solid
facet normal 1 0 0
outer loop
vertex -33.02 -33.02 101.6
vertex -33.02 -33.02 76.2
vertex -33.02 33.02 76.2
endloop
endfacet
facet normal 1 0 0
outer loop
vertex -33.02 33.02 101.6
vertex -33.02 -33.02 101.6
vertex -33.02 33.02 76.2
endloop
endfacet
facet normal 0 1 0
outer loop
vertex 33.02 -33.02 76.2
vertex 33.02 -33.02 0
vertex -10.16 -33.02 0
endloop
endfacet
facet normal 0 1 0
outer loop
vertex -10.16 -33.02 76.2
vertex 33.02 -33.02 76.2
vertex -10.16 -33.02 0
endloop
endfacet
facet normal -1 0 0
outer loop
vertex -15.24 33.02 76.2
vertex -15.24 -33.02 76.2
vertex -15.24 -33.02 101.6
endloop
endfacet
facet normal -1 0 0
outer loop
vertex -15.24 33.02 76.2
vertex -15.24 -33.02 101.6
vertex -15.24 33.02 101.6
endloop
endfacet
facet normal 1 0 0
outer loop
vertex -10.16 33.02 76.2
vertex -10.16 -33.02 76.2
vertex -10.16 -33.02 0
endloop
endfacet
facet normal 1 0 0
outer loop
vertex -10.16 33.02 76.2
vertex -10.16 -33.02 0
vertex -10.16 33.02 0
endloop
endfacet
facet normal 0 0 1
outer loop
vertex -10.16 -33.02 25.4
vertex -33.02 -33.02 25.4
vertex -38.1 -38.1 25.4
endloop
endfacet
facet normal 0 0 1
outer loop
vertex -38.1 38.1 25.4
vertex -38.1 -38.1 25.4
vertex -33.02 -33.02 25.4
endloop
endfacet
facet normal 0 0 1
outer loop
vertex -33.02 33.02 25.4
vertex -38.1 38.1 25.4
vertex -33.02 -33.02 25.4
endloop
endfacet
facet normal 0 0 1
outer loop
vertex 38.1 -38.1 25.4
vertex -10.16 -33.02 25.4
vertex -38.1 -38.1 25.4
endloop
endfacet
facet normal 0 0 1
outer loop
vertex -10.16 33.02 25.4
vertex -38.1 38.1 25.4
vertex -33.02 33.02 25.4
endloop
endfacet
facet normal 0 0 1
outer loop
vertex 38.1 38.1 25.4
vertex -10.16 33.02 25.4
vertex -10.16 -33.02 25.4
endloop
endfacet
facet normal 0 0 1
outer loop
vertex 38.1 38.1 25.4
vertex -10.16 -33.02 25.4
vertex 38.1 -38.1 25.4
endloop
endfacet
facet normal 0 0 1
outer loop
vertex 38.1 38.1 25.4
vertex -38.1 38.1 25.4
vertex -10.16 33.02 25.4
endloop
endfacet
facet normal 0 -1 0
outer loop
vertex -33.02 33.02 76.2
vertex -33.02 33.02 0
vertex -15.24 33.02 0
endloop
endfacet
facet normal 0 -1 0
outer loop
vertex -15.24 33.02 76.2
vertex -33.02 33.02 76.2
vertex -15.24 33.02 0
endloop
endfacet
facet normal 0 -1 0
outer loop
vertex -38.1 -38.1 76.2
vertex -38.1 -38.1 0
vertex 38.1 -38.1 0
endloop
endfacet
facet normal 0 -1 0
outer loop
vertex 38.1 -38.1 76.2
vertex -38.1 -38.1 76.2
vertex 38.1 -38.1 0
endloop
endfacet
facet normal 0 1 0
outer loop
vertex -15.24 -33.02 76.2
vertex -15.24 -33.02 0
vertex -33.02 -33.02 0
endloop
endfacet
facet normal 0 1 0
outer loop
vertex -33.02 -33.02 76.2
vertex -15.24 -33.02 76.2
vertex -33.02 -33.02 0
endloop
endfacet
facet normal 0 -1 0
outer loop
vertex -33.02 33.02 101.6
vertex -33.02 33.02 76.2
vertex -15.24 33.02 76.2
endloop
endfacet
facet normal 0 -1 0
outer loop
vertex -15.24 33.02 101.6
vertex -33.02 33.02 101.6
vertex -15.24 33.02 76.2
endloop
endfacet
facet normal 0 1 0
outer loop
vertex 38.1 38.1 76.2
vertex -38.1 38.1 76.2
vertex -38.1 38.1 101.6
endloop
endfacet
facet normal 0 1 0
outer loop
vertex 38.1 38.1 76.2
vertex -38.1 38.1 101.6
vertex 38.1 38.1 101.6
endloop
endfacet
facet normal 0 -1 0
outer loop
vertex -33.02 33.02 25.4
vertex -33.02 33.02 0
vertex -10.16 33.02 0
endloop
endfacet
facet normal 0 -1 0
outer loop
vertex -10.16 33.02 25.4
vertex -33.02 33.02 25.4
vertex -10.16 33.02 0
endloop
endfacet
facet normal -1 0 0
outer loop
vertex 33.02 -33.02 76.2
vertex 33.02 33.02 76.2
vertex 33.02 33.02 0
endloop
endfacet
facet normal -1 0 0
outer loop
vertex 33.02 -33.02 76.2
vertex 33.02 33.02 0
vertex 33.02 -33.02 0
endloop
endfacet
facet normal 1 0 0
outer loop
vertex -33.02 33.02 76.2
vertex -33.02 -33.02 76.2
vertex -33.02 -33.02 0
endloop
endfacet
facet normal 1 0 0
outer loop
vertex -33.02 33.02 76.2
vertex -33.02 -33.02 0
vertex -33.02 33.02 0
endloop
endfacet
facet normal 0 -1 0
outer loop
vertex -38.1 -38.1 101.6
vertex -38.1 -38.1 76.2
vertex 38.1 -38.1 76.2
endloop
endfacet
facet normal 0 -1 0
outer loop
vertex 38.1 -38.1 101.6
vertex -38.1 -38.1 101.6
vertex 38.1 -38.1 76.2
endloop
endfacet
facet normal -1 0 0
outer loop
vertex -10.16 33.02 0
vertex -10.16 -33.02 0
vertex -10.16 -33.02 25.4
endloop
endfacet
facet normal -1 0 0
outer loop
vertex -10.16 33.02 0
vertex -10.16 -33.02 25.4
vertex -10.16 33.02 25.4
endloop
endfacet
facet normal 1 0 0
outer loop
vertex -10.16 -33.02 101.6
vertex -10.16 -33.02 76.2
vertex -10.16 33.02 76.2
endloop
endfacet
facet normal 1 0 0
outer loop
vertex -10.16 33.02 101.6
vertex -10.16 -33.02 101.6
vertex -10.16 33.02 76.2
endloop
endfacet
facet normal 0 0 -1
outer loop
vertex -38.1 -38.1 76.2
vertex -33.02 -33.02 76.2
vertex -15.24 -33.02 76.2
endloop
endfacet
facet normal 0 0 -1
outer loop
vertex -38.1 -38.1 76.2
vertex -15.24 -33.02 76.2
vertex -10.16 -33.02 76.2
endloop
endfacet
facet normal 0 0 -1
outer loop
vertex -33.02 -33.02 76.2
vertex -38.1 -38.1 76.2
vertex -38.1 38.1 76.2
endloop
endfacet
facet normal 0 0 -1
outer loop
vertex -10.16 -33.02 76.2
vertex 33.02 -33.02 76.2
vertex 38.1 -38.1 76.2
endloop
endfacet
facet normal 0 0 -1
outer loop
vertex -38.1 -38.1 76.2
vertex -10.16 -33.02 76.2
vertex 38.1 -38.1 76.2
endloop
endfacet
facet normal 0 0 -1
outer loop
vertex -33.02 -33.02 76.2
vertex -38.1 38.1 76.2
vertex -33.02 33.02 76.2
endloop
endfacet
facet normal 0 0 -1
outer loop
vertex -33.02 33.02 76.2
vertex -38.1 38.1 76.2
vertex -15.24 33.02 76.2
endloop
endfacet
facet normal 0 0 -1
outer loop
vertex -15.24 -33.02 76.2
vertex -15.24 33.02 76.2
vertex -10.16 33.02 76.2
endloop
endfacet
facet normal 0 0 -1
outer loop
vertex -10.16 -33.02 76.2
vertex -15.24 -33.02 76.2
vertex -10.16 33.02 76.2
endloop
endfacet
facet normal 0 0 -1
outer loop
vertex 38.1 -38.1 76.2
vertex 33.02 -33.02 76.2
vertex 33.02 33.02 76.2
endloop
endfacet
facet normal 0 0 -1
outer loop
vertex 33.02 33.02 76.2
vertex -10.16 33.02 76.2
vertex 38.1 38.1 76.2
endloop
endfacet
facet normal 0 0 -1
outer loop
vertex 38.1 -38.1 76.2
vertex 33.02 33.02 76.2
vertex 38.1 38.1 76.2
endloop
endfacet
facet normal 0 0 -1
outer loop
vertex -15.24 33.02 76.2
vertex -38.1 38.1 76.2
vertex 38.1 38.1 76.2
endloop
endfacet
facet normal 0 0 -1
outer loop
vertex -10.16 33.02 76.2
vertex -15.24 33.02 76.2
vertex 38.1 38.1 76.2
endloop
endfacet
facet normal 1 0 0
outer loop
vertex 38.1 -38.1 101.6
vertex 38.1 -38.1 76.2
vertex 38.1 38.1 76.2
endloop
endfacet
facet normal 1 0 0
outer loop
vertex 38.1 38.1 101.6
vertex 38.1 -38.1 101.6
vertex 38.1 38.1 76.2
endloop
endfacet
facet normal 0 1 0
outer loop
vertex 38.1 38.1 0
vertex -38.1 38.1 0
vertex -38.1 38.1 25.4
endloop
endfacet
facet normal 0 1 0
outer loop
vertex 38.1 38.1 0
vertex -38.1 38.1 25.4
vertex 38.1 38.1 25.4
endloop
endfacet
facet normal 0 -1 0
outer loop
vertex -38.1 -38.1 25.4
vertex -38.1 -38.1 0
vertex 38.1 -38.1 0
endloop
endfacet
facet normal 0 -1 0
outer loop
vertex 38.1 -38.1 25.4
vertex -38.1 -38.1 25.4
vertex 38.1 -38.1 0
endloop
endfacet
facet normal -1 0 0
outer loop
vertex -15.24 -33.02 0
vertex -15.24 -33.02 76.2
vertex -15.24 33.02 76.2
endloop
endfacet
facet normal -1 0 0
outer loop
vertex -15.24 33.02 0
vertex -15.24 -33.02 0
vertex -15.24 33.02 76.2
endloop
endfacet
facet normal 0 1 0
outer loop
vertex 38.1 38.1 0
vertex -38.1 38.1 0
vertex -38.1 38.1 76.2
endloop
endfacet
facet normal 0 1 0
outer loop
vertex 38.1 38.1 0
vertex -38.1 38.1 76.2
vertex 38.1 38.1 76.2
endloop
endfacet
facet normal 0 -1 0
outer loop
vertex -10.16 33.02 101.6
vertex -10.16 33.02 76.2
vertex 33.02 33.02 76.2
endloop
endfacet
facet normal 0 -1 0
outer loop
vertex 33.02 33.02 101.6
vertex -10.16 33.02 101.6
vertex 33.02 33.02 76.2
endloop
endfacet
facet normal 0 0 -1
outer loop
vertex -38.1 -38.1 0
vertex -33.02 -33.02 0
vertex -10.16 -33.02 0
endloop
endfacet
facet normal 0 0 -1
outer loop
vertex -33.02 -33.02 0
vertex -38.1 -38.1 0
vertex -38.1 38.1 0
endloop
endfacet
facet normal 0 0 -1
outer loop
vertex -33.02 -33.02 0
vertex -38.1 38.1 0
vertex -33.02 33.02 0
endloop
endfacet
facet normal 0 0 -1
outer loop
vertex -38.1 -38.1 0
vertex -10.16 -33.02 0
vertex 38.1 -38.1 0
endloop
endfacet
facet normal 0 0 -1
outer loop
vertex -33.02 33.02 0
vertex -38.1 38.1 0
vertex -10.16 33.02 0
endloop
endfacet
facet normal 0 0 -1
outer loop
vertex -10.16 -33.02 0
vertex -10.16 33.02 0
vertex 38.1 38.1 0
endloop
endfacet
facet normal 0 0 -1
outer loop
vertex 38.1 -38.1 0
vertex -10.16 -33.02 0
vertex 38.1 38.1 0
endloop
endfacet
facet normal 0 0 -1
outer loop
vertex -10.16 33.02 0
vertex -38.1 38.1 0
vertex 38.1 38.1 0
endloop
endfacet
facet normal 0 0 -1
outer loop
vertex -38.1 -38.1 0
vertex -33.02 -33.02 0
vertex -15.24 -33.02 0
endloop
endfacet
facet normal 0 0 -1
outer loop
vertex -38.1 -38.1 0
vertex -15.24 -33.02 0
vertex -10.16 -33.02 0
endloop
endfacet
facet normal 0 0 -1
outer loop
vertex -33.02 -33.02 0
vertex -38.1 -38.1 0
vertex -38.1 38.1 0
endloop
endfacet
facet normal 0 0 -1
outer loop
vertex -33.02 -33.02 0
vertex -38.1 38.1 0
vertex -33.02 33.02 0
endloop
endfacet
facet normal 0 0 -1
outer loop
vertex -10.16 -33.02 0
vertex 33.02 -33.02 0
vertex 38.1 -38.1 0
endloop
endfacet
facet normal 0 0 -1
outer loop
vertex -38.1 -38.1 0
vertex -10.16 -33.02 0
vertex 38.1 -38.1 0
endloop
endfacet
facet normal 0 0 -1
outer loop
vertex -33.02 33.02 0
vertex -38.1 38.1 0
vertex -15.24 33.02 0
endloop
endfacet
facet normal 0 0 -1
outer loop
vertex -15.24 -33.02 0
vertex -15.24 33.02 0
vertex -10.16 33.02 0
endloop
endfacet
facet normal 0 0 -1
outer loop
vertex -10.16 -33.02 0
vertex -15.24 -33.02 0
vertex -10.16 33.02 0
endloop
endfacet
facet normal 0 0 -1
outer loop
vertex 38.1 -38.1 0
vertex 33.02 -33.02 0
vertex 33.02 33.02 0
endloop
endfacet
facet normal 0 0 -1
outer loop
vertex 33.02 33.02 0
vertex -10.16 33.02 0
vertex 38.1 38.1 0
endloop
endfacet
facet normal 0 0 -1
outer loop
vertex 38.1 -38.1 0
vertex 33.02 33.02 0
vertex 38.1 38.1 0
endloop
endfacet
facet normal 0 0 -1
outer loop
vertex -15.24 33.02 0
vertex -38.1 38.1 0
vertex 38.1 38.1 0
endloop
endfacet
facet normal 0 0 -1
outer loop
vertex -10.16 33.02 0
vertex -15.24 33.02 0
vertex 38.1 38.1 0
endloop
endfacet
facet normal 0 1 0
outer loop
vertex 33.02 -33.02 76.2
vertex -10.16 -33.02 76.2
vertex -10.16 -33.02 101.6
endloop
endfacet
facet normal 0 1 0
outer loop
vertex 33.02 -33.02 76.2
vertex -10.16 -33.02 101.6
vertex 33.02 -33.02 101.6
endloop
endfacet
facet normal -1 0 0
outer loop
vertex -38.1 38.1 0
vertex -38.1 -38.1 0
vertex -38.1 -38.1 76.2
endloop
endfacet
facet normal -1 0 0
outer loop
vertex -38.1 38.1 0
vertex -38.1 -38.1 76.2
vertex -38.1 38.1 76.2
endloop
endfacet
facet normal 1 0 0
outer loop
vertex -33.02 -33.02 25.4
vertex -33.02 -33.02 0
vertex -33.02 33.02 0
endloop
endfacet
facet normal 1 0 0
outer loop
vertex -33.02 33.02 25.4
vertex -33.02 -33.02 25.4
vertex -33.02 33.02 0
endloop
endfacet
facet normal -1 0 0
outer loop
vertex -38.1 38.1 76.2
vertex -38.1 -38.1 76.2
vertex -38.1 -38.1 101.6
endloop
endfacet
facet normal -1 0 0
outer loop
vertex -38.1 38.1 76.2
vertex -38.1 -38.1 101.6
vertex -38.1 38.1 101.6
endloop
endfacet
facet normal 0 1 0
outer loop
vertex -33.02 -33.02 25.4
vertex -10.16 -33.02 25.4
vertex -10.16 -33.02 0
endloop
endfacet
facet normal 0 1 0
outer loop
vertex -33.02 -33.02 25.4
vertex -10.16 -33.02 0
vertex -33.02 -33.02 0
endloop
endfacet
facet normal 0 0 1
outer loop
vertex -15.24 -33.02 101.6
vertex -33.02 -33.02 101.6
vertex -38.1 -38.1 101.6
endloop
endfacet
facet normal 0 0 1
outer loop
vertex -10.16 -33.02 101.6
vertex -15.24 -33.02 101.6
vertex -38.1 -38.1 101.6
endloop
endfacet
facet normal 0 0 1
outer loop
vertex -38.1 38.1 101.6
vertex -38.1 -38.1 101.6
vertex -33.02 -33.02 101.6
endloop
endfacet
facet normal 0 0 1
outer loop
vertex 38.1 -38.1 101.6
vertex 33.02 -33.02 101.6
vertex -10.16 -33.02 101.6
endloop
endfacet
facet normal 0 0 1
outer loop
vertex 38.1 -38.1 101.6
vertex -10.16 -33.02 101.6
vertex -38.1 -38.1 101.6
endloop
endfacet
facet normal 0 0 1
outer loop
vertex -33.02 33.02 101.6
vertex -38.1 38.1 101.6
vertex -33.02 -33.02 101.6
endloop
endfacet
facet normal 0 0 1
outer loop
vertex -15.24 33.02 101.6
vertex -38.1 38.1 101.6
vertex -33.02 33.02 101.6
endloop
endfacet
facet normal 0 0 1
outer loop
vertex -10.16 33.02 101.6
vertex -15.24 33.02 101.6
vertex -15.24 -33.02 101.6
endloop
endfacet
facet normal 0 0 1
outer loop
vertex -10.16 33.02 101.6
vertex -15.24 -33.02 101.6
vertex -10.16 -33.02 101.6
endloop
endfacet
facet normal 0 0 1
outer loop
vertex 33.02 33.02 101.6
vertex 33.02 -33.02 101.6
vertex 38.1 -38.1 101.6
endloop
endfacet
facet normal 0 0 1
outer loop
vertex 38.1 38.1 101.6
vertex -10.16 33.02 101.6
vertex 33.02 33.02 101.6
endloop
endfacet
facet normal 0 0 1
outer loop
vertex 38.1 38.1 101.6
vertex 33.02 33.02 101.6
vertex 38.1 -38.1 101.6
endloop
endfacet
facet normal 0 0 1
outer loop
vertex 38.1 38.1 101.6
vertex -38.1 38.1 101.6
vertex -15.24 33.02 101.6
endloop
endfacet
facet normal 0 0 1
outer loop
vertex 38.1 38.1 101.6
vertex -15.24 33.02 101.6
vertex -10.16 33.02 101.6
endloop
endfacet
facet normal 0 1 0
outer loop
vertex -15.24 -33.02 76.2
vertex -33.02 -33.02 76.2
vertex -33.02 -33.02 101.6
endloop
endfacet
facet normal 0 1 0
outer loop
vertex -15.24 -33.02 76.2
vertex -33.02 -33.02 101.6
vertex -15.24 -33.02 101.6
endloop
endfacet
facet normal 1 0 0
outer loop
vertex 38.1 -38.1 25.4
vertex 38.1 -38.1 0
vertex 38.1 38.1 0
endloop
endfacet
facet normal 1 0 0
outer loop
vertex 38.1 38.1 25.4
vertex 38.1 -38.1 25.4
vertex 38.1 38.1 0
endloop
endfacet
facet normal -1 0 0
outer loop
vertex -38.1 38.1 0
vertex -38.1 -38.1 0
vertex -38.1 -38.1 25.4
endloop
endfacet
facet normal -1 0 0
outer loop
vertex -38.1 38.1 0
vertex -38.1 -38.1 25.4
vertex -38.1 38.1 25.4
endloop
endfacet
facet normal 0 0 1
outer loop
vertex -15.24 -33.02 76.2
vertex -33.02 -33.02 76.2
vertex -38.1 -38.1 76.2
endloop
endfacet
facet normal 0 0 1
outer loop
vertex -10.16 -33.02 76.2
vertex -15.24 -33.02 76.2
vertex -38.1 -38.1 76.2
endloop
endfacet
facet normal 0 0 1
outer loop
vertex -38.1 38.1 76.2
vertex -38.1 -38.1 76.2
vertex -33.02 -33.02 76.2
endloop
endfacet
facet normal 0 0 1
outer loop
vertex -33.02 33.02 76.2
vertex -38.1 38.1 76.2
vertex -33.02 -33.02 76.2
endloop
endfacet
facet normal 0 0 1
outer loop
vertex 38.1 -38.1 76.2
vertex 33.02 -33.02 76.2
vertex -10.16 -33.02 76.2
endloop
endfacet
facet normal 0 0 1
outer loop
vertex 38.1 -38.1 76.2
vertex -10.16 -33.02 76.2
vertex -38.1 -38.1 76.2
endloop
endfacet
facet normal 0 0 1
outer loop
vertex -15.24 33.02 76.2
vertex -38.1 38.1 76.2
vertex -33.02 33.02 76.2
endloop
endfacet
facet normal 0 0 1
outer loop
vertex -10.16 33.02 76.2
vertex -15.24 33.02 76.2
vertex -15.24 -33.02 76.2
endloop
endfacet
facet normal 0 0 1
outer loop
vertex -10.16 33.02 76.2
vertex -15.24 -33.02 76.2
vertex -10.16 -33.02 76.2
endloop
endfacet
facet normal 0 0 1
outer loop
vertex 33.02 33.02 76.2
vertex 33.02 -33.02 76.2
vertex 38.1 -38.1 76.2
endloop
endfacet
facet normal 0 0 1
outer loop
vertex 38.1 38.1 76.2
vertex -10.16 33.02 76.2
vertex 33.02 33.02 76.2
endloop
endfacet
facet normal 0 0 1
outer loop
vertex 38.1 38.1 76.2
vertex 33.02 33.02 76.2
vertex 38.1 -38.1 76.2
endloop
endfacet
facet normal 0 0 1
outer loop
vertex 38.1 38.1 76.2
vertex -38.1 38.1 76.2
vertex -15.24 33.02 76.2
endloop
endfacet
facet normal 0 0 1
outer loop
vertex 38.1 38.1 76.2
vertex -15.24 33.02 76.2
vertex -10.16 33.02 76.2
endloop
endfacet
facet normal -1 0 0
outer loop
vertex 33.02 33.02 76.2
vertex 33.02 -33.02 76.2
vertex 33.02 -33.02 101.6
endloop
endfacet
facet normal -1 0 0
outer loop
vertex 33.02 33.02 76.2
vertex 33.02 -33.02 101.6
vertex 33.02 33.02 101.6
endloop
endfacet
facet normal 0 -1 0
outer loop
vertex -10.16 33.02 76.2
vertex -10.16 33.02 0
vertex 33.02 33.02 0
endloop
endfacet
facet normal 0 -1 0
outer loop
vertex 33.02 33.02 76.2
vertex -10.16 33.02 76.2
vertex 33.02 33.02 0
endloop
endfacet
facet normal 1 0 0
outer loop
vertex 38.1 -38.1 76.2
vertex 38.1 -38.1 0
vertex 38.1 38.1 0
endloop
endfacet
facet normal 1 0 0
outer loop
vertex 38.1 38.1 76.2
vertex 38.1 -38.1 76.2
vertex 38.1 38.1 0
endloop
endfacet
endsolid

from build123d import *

# Parameters (mm, degrees)
F0_W        = 76.2
F0_H        = 76.2
F0_W_2      = 5.08
F0_H_2      = 66.04
F1_DEPTH    = 76.2
F0_W_3      = 43.18
F1_FACE_W   = 76.2
F1_FACE_H   = 76.2
F1_FACE_W_2 = 43.18
F1_FACE_H_2 = 66.04
F1_FACE_W_3 = 17.78
F2_DEPTH    = 25.4


# Not quite as in the source:
# - a feature names something its author has since deleted; it is built from what else it names


with BuildPart() as f1:
    # F0 (on Top) → F1 (new body)
    with BuildSketch(Plane.XY):
        Rectangle(F0_W, F0_H)
        Polygon((-10.16, 33.02), (33.02, 33.02), (33.02, -33.02), (-10.16, -33.02), (-15.24, -33.02), (-33.02, -33.02), (-33.02, 33.02), (-15.24, 33.02), align=None, mode=Mode.SUBTRACT)
        with Locations((-12.7, 0)):
            Rectangle(F0_W_2, F0_H_2)
    extrude(amount=F1_DEPTH)


with BuildPart() as f2:
    # F0 (on Top) + F1_face (on face) → F2 (new body)
    with BuildSketch(Plane.XY):
        Rectangle(F0_W, F0_H)
        Polygon((-10.16, 33.02), (33.02, 33.02), (33.02, -33.02), (-10.16, -33.02), (-15.24, -33.02), (-33.02, -33.02), (-33.02, 33.02), (-15.24, 33.02), align=None, mode=Mode.SUBTRACT)
        with Locations((11.43, 0)):
            Rectangle(F0_W_3, F0_H_2)
    with BuildSketch(Plane(origin=(-2.3927536232, 0, 76.2), x_dir=(1, 0, 0), z_dir=(0, 0, 1))):
        with Locations((2.3927536232, 0)):
            Rectangle(F1_FACE_W, F1_FACE_H)
        with Locations((13.8227536232, 0)):
            Rectangle(F1_FACE_W_2, F1_FACE_H_2, mode=Mode.SUBTRACT)
        with Locations((-21.7372463768, 0)):
            Rectangle(F1_FACE_W_3, F1_FACE_H_2, mode=Mode.SUBTRACT)
    extrude(amount=F2_DEPTH)


solid = Compound([f1.part, f2.part])
